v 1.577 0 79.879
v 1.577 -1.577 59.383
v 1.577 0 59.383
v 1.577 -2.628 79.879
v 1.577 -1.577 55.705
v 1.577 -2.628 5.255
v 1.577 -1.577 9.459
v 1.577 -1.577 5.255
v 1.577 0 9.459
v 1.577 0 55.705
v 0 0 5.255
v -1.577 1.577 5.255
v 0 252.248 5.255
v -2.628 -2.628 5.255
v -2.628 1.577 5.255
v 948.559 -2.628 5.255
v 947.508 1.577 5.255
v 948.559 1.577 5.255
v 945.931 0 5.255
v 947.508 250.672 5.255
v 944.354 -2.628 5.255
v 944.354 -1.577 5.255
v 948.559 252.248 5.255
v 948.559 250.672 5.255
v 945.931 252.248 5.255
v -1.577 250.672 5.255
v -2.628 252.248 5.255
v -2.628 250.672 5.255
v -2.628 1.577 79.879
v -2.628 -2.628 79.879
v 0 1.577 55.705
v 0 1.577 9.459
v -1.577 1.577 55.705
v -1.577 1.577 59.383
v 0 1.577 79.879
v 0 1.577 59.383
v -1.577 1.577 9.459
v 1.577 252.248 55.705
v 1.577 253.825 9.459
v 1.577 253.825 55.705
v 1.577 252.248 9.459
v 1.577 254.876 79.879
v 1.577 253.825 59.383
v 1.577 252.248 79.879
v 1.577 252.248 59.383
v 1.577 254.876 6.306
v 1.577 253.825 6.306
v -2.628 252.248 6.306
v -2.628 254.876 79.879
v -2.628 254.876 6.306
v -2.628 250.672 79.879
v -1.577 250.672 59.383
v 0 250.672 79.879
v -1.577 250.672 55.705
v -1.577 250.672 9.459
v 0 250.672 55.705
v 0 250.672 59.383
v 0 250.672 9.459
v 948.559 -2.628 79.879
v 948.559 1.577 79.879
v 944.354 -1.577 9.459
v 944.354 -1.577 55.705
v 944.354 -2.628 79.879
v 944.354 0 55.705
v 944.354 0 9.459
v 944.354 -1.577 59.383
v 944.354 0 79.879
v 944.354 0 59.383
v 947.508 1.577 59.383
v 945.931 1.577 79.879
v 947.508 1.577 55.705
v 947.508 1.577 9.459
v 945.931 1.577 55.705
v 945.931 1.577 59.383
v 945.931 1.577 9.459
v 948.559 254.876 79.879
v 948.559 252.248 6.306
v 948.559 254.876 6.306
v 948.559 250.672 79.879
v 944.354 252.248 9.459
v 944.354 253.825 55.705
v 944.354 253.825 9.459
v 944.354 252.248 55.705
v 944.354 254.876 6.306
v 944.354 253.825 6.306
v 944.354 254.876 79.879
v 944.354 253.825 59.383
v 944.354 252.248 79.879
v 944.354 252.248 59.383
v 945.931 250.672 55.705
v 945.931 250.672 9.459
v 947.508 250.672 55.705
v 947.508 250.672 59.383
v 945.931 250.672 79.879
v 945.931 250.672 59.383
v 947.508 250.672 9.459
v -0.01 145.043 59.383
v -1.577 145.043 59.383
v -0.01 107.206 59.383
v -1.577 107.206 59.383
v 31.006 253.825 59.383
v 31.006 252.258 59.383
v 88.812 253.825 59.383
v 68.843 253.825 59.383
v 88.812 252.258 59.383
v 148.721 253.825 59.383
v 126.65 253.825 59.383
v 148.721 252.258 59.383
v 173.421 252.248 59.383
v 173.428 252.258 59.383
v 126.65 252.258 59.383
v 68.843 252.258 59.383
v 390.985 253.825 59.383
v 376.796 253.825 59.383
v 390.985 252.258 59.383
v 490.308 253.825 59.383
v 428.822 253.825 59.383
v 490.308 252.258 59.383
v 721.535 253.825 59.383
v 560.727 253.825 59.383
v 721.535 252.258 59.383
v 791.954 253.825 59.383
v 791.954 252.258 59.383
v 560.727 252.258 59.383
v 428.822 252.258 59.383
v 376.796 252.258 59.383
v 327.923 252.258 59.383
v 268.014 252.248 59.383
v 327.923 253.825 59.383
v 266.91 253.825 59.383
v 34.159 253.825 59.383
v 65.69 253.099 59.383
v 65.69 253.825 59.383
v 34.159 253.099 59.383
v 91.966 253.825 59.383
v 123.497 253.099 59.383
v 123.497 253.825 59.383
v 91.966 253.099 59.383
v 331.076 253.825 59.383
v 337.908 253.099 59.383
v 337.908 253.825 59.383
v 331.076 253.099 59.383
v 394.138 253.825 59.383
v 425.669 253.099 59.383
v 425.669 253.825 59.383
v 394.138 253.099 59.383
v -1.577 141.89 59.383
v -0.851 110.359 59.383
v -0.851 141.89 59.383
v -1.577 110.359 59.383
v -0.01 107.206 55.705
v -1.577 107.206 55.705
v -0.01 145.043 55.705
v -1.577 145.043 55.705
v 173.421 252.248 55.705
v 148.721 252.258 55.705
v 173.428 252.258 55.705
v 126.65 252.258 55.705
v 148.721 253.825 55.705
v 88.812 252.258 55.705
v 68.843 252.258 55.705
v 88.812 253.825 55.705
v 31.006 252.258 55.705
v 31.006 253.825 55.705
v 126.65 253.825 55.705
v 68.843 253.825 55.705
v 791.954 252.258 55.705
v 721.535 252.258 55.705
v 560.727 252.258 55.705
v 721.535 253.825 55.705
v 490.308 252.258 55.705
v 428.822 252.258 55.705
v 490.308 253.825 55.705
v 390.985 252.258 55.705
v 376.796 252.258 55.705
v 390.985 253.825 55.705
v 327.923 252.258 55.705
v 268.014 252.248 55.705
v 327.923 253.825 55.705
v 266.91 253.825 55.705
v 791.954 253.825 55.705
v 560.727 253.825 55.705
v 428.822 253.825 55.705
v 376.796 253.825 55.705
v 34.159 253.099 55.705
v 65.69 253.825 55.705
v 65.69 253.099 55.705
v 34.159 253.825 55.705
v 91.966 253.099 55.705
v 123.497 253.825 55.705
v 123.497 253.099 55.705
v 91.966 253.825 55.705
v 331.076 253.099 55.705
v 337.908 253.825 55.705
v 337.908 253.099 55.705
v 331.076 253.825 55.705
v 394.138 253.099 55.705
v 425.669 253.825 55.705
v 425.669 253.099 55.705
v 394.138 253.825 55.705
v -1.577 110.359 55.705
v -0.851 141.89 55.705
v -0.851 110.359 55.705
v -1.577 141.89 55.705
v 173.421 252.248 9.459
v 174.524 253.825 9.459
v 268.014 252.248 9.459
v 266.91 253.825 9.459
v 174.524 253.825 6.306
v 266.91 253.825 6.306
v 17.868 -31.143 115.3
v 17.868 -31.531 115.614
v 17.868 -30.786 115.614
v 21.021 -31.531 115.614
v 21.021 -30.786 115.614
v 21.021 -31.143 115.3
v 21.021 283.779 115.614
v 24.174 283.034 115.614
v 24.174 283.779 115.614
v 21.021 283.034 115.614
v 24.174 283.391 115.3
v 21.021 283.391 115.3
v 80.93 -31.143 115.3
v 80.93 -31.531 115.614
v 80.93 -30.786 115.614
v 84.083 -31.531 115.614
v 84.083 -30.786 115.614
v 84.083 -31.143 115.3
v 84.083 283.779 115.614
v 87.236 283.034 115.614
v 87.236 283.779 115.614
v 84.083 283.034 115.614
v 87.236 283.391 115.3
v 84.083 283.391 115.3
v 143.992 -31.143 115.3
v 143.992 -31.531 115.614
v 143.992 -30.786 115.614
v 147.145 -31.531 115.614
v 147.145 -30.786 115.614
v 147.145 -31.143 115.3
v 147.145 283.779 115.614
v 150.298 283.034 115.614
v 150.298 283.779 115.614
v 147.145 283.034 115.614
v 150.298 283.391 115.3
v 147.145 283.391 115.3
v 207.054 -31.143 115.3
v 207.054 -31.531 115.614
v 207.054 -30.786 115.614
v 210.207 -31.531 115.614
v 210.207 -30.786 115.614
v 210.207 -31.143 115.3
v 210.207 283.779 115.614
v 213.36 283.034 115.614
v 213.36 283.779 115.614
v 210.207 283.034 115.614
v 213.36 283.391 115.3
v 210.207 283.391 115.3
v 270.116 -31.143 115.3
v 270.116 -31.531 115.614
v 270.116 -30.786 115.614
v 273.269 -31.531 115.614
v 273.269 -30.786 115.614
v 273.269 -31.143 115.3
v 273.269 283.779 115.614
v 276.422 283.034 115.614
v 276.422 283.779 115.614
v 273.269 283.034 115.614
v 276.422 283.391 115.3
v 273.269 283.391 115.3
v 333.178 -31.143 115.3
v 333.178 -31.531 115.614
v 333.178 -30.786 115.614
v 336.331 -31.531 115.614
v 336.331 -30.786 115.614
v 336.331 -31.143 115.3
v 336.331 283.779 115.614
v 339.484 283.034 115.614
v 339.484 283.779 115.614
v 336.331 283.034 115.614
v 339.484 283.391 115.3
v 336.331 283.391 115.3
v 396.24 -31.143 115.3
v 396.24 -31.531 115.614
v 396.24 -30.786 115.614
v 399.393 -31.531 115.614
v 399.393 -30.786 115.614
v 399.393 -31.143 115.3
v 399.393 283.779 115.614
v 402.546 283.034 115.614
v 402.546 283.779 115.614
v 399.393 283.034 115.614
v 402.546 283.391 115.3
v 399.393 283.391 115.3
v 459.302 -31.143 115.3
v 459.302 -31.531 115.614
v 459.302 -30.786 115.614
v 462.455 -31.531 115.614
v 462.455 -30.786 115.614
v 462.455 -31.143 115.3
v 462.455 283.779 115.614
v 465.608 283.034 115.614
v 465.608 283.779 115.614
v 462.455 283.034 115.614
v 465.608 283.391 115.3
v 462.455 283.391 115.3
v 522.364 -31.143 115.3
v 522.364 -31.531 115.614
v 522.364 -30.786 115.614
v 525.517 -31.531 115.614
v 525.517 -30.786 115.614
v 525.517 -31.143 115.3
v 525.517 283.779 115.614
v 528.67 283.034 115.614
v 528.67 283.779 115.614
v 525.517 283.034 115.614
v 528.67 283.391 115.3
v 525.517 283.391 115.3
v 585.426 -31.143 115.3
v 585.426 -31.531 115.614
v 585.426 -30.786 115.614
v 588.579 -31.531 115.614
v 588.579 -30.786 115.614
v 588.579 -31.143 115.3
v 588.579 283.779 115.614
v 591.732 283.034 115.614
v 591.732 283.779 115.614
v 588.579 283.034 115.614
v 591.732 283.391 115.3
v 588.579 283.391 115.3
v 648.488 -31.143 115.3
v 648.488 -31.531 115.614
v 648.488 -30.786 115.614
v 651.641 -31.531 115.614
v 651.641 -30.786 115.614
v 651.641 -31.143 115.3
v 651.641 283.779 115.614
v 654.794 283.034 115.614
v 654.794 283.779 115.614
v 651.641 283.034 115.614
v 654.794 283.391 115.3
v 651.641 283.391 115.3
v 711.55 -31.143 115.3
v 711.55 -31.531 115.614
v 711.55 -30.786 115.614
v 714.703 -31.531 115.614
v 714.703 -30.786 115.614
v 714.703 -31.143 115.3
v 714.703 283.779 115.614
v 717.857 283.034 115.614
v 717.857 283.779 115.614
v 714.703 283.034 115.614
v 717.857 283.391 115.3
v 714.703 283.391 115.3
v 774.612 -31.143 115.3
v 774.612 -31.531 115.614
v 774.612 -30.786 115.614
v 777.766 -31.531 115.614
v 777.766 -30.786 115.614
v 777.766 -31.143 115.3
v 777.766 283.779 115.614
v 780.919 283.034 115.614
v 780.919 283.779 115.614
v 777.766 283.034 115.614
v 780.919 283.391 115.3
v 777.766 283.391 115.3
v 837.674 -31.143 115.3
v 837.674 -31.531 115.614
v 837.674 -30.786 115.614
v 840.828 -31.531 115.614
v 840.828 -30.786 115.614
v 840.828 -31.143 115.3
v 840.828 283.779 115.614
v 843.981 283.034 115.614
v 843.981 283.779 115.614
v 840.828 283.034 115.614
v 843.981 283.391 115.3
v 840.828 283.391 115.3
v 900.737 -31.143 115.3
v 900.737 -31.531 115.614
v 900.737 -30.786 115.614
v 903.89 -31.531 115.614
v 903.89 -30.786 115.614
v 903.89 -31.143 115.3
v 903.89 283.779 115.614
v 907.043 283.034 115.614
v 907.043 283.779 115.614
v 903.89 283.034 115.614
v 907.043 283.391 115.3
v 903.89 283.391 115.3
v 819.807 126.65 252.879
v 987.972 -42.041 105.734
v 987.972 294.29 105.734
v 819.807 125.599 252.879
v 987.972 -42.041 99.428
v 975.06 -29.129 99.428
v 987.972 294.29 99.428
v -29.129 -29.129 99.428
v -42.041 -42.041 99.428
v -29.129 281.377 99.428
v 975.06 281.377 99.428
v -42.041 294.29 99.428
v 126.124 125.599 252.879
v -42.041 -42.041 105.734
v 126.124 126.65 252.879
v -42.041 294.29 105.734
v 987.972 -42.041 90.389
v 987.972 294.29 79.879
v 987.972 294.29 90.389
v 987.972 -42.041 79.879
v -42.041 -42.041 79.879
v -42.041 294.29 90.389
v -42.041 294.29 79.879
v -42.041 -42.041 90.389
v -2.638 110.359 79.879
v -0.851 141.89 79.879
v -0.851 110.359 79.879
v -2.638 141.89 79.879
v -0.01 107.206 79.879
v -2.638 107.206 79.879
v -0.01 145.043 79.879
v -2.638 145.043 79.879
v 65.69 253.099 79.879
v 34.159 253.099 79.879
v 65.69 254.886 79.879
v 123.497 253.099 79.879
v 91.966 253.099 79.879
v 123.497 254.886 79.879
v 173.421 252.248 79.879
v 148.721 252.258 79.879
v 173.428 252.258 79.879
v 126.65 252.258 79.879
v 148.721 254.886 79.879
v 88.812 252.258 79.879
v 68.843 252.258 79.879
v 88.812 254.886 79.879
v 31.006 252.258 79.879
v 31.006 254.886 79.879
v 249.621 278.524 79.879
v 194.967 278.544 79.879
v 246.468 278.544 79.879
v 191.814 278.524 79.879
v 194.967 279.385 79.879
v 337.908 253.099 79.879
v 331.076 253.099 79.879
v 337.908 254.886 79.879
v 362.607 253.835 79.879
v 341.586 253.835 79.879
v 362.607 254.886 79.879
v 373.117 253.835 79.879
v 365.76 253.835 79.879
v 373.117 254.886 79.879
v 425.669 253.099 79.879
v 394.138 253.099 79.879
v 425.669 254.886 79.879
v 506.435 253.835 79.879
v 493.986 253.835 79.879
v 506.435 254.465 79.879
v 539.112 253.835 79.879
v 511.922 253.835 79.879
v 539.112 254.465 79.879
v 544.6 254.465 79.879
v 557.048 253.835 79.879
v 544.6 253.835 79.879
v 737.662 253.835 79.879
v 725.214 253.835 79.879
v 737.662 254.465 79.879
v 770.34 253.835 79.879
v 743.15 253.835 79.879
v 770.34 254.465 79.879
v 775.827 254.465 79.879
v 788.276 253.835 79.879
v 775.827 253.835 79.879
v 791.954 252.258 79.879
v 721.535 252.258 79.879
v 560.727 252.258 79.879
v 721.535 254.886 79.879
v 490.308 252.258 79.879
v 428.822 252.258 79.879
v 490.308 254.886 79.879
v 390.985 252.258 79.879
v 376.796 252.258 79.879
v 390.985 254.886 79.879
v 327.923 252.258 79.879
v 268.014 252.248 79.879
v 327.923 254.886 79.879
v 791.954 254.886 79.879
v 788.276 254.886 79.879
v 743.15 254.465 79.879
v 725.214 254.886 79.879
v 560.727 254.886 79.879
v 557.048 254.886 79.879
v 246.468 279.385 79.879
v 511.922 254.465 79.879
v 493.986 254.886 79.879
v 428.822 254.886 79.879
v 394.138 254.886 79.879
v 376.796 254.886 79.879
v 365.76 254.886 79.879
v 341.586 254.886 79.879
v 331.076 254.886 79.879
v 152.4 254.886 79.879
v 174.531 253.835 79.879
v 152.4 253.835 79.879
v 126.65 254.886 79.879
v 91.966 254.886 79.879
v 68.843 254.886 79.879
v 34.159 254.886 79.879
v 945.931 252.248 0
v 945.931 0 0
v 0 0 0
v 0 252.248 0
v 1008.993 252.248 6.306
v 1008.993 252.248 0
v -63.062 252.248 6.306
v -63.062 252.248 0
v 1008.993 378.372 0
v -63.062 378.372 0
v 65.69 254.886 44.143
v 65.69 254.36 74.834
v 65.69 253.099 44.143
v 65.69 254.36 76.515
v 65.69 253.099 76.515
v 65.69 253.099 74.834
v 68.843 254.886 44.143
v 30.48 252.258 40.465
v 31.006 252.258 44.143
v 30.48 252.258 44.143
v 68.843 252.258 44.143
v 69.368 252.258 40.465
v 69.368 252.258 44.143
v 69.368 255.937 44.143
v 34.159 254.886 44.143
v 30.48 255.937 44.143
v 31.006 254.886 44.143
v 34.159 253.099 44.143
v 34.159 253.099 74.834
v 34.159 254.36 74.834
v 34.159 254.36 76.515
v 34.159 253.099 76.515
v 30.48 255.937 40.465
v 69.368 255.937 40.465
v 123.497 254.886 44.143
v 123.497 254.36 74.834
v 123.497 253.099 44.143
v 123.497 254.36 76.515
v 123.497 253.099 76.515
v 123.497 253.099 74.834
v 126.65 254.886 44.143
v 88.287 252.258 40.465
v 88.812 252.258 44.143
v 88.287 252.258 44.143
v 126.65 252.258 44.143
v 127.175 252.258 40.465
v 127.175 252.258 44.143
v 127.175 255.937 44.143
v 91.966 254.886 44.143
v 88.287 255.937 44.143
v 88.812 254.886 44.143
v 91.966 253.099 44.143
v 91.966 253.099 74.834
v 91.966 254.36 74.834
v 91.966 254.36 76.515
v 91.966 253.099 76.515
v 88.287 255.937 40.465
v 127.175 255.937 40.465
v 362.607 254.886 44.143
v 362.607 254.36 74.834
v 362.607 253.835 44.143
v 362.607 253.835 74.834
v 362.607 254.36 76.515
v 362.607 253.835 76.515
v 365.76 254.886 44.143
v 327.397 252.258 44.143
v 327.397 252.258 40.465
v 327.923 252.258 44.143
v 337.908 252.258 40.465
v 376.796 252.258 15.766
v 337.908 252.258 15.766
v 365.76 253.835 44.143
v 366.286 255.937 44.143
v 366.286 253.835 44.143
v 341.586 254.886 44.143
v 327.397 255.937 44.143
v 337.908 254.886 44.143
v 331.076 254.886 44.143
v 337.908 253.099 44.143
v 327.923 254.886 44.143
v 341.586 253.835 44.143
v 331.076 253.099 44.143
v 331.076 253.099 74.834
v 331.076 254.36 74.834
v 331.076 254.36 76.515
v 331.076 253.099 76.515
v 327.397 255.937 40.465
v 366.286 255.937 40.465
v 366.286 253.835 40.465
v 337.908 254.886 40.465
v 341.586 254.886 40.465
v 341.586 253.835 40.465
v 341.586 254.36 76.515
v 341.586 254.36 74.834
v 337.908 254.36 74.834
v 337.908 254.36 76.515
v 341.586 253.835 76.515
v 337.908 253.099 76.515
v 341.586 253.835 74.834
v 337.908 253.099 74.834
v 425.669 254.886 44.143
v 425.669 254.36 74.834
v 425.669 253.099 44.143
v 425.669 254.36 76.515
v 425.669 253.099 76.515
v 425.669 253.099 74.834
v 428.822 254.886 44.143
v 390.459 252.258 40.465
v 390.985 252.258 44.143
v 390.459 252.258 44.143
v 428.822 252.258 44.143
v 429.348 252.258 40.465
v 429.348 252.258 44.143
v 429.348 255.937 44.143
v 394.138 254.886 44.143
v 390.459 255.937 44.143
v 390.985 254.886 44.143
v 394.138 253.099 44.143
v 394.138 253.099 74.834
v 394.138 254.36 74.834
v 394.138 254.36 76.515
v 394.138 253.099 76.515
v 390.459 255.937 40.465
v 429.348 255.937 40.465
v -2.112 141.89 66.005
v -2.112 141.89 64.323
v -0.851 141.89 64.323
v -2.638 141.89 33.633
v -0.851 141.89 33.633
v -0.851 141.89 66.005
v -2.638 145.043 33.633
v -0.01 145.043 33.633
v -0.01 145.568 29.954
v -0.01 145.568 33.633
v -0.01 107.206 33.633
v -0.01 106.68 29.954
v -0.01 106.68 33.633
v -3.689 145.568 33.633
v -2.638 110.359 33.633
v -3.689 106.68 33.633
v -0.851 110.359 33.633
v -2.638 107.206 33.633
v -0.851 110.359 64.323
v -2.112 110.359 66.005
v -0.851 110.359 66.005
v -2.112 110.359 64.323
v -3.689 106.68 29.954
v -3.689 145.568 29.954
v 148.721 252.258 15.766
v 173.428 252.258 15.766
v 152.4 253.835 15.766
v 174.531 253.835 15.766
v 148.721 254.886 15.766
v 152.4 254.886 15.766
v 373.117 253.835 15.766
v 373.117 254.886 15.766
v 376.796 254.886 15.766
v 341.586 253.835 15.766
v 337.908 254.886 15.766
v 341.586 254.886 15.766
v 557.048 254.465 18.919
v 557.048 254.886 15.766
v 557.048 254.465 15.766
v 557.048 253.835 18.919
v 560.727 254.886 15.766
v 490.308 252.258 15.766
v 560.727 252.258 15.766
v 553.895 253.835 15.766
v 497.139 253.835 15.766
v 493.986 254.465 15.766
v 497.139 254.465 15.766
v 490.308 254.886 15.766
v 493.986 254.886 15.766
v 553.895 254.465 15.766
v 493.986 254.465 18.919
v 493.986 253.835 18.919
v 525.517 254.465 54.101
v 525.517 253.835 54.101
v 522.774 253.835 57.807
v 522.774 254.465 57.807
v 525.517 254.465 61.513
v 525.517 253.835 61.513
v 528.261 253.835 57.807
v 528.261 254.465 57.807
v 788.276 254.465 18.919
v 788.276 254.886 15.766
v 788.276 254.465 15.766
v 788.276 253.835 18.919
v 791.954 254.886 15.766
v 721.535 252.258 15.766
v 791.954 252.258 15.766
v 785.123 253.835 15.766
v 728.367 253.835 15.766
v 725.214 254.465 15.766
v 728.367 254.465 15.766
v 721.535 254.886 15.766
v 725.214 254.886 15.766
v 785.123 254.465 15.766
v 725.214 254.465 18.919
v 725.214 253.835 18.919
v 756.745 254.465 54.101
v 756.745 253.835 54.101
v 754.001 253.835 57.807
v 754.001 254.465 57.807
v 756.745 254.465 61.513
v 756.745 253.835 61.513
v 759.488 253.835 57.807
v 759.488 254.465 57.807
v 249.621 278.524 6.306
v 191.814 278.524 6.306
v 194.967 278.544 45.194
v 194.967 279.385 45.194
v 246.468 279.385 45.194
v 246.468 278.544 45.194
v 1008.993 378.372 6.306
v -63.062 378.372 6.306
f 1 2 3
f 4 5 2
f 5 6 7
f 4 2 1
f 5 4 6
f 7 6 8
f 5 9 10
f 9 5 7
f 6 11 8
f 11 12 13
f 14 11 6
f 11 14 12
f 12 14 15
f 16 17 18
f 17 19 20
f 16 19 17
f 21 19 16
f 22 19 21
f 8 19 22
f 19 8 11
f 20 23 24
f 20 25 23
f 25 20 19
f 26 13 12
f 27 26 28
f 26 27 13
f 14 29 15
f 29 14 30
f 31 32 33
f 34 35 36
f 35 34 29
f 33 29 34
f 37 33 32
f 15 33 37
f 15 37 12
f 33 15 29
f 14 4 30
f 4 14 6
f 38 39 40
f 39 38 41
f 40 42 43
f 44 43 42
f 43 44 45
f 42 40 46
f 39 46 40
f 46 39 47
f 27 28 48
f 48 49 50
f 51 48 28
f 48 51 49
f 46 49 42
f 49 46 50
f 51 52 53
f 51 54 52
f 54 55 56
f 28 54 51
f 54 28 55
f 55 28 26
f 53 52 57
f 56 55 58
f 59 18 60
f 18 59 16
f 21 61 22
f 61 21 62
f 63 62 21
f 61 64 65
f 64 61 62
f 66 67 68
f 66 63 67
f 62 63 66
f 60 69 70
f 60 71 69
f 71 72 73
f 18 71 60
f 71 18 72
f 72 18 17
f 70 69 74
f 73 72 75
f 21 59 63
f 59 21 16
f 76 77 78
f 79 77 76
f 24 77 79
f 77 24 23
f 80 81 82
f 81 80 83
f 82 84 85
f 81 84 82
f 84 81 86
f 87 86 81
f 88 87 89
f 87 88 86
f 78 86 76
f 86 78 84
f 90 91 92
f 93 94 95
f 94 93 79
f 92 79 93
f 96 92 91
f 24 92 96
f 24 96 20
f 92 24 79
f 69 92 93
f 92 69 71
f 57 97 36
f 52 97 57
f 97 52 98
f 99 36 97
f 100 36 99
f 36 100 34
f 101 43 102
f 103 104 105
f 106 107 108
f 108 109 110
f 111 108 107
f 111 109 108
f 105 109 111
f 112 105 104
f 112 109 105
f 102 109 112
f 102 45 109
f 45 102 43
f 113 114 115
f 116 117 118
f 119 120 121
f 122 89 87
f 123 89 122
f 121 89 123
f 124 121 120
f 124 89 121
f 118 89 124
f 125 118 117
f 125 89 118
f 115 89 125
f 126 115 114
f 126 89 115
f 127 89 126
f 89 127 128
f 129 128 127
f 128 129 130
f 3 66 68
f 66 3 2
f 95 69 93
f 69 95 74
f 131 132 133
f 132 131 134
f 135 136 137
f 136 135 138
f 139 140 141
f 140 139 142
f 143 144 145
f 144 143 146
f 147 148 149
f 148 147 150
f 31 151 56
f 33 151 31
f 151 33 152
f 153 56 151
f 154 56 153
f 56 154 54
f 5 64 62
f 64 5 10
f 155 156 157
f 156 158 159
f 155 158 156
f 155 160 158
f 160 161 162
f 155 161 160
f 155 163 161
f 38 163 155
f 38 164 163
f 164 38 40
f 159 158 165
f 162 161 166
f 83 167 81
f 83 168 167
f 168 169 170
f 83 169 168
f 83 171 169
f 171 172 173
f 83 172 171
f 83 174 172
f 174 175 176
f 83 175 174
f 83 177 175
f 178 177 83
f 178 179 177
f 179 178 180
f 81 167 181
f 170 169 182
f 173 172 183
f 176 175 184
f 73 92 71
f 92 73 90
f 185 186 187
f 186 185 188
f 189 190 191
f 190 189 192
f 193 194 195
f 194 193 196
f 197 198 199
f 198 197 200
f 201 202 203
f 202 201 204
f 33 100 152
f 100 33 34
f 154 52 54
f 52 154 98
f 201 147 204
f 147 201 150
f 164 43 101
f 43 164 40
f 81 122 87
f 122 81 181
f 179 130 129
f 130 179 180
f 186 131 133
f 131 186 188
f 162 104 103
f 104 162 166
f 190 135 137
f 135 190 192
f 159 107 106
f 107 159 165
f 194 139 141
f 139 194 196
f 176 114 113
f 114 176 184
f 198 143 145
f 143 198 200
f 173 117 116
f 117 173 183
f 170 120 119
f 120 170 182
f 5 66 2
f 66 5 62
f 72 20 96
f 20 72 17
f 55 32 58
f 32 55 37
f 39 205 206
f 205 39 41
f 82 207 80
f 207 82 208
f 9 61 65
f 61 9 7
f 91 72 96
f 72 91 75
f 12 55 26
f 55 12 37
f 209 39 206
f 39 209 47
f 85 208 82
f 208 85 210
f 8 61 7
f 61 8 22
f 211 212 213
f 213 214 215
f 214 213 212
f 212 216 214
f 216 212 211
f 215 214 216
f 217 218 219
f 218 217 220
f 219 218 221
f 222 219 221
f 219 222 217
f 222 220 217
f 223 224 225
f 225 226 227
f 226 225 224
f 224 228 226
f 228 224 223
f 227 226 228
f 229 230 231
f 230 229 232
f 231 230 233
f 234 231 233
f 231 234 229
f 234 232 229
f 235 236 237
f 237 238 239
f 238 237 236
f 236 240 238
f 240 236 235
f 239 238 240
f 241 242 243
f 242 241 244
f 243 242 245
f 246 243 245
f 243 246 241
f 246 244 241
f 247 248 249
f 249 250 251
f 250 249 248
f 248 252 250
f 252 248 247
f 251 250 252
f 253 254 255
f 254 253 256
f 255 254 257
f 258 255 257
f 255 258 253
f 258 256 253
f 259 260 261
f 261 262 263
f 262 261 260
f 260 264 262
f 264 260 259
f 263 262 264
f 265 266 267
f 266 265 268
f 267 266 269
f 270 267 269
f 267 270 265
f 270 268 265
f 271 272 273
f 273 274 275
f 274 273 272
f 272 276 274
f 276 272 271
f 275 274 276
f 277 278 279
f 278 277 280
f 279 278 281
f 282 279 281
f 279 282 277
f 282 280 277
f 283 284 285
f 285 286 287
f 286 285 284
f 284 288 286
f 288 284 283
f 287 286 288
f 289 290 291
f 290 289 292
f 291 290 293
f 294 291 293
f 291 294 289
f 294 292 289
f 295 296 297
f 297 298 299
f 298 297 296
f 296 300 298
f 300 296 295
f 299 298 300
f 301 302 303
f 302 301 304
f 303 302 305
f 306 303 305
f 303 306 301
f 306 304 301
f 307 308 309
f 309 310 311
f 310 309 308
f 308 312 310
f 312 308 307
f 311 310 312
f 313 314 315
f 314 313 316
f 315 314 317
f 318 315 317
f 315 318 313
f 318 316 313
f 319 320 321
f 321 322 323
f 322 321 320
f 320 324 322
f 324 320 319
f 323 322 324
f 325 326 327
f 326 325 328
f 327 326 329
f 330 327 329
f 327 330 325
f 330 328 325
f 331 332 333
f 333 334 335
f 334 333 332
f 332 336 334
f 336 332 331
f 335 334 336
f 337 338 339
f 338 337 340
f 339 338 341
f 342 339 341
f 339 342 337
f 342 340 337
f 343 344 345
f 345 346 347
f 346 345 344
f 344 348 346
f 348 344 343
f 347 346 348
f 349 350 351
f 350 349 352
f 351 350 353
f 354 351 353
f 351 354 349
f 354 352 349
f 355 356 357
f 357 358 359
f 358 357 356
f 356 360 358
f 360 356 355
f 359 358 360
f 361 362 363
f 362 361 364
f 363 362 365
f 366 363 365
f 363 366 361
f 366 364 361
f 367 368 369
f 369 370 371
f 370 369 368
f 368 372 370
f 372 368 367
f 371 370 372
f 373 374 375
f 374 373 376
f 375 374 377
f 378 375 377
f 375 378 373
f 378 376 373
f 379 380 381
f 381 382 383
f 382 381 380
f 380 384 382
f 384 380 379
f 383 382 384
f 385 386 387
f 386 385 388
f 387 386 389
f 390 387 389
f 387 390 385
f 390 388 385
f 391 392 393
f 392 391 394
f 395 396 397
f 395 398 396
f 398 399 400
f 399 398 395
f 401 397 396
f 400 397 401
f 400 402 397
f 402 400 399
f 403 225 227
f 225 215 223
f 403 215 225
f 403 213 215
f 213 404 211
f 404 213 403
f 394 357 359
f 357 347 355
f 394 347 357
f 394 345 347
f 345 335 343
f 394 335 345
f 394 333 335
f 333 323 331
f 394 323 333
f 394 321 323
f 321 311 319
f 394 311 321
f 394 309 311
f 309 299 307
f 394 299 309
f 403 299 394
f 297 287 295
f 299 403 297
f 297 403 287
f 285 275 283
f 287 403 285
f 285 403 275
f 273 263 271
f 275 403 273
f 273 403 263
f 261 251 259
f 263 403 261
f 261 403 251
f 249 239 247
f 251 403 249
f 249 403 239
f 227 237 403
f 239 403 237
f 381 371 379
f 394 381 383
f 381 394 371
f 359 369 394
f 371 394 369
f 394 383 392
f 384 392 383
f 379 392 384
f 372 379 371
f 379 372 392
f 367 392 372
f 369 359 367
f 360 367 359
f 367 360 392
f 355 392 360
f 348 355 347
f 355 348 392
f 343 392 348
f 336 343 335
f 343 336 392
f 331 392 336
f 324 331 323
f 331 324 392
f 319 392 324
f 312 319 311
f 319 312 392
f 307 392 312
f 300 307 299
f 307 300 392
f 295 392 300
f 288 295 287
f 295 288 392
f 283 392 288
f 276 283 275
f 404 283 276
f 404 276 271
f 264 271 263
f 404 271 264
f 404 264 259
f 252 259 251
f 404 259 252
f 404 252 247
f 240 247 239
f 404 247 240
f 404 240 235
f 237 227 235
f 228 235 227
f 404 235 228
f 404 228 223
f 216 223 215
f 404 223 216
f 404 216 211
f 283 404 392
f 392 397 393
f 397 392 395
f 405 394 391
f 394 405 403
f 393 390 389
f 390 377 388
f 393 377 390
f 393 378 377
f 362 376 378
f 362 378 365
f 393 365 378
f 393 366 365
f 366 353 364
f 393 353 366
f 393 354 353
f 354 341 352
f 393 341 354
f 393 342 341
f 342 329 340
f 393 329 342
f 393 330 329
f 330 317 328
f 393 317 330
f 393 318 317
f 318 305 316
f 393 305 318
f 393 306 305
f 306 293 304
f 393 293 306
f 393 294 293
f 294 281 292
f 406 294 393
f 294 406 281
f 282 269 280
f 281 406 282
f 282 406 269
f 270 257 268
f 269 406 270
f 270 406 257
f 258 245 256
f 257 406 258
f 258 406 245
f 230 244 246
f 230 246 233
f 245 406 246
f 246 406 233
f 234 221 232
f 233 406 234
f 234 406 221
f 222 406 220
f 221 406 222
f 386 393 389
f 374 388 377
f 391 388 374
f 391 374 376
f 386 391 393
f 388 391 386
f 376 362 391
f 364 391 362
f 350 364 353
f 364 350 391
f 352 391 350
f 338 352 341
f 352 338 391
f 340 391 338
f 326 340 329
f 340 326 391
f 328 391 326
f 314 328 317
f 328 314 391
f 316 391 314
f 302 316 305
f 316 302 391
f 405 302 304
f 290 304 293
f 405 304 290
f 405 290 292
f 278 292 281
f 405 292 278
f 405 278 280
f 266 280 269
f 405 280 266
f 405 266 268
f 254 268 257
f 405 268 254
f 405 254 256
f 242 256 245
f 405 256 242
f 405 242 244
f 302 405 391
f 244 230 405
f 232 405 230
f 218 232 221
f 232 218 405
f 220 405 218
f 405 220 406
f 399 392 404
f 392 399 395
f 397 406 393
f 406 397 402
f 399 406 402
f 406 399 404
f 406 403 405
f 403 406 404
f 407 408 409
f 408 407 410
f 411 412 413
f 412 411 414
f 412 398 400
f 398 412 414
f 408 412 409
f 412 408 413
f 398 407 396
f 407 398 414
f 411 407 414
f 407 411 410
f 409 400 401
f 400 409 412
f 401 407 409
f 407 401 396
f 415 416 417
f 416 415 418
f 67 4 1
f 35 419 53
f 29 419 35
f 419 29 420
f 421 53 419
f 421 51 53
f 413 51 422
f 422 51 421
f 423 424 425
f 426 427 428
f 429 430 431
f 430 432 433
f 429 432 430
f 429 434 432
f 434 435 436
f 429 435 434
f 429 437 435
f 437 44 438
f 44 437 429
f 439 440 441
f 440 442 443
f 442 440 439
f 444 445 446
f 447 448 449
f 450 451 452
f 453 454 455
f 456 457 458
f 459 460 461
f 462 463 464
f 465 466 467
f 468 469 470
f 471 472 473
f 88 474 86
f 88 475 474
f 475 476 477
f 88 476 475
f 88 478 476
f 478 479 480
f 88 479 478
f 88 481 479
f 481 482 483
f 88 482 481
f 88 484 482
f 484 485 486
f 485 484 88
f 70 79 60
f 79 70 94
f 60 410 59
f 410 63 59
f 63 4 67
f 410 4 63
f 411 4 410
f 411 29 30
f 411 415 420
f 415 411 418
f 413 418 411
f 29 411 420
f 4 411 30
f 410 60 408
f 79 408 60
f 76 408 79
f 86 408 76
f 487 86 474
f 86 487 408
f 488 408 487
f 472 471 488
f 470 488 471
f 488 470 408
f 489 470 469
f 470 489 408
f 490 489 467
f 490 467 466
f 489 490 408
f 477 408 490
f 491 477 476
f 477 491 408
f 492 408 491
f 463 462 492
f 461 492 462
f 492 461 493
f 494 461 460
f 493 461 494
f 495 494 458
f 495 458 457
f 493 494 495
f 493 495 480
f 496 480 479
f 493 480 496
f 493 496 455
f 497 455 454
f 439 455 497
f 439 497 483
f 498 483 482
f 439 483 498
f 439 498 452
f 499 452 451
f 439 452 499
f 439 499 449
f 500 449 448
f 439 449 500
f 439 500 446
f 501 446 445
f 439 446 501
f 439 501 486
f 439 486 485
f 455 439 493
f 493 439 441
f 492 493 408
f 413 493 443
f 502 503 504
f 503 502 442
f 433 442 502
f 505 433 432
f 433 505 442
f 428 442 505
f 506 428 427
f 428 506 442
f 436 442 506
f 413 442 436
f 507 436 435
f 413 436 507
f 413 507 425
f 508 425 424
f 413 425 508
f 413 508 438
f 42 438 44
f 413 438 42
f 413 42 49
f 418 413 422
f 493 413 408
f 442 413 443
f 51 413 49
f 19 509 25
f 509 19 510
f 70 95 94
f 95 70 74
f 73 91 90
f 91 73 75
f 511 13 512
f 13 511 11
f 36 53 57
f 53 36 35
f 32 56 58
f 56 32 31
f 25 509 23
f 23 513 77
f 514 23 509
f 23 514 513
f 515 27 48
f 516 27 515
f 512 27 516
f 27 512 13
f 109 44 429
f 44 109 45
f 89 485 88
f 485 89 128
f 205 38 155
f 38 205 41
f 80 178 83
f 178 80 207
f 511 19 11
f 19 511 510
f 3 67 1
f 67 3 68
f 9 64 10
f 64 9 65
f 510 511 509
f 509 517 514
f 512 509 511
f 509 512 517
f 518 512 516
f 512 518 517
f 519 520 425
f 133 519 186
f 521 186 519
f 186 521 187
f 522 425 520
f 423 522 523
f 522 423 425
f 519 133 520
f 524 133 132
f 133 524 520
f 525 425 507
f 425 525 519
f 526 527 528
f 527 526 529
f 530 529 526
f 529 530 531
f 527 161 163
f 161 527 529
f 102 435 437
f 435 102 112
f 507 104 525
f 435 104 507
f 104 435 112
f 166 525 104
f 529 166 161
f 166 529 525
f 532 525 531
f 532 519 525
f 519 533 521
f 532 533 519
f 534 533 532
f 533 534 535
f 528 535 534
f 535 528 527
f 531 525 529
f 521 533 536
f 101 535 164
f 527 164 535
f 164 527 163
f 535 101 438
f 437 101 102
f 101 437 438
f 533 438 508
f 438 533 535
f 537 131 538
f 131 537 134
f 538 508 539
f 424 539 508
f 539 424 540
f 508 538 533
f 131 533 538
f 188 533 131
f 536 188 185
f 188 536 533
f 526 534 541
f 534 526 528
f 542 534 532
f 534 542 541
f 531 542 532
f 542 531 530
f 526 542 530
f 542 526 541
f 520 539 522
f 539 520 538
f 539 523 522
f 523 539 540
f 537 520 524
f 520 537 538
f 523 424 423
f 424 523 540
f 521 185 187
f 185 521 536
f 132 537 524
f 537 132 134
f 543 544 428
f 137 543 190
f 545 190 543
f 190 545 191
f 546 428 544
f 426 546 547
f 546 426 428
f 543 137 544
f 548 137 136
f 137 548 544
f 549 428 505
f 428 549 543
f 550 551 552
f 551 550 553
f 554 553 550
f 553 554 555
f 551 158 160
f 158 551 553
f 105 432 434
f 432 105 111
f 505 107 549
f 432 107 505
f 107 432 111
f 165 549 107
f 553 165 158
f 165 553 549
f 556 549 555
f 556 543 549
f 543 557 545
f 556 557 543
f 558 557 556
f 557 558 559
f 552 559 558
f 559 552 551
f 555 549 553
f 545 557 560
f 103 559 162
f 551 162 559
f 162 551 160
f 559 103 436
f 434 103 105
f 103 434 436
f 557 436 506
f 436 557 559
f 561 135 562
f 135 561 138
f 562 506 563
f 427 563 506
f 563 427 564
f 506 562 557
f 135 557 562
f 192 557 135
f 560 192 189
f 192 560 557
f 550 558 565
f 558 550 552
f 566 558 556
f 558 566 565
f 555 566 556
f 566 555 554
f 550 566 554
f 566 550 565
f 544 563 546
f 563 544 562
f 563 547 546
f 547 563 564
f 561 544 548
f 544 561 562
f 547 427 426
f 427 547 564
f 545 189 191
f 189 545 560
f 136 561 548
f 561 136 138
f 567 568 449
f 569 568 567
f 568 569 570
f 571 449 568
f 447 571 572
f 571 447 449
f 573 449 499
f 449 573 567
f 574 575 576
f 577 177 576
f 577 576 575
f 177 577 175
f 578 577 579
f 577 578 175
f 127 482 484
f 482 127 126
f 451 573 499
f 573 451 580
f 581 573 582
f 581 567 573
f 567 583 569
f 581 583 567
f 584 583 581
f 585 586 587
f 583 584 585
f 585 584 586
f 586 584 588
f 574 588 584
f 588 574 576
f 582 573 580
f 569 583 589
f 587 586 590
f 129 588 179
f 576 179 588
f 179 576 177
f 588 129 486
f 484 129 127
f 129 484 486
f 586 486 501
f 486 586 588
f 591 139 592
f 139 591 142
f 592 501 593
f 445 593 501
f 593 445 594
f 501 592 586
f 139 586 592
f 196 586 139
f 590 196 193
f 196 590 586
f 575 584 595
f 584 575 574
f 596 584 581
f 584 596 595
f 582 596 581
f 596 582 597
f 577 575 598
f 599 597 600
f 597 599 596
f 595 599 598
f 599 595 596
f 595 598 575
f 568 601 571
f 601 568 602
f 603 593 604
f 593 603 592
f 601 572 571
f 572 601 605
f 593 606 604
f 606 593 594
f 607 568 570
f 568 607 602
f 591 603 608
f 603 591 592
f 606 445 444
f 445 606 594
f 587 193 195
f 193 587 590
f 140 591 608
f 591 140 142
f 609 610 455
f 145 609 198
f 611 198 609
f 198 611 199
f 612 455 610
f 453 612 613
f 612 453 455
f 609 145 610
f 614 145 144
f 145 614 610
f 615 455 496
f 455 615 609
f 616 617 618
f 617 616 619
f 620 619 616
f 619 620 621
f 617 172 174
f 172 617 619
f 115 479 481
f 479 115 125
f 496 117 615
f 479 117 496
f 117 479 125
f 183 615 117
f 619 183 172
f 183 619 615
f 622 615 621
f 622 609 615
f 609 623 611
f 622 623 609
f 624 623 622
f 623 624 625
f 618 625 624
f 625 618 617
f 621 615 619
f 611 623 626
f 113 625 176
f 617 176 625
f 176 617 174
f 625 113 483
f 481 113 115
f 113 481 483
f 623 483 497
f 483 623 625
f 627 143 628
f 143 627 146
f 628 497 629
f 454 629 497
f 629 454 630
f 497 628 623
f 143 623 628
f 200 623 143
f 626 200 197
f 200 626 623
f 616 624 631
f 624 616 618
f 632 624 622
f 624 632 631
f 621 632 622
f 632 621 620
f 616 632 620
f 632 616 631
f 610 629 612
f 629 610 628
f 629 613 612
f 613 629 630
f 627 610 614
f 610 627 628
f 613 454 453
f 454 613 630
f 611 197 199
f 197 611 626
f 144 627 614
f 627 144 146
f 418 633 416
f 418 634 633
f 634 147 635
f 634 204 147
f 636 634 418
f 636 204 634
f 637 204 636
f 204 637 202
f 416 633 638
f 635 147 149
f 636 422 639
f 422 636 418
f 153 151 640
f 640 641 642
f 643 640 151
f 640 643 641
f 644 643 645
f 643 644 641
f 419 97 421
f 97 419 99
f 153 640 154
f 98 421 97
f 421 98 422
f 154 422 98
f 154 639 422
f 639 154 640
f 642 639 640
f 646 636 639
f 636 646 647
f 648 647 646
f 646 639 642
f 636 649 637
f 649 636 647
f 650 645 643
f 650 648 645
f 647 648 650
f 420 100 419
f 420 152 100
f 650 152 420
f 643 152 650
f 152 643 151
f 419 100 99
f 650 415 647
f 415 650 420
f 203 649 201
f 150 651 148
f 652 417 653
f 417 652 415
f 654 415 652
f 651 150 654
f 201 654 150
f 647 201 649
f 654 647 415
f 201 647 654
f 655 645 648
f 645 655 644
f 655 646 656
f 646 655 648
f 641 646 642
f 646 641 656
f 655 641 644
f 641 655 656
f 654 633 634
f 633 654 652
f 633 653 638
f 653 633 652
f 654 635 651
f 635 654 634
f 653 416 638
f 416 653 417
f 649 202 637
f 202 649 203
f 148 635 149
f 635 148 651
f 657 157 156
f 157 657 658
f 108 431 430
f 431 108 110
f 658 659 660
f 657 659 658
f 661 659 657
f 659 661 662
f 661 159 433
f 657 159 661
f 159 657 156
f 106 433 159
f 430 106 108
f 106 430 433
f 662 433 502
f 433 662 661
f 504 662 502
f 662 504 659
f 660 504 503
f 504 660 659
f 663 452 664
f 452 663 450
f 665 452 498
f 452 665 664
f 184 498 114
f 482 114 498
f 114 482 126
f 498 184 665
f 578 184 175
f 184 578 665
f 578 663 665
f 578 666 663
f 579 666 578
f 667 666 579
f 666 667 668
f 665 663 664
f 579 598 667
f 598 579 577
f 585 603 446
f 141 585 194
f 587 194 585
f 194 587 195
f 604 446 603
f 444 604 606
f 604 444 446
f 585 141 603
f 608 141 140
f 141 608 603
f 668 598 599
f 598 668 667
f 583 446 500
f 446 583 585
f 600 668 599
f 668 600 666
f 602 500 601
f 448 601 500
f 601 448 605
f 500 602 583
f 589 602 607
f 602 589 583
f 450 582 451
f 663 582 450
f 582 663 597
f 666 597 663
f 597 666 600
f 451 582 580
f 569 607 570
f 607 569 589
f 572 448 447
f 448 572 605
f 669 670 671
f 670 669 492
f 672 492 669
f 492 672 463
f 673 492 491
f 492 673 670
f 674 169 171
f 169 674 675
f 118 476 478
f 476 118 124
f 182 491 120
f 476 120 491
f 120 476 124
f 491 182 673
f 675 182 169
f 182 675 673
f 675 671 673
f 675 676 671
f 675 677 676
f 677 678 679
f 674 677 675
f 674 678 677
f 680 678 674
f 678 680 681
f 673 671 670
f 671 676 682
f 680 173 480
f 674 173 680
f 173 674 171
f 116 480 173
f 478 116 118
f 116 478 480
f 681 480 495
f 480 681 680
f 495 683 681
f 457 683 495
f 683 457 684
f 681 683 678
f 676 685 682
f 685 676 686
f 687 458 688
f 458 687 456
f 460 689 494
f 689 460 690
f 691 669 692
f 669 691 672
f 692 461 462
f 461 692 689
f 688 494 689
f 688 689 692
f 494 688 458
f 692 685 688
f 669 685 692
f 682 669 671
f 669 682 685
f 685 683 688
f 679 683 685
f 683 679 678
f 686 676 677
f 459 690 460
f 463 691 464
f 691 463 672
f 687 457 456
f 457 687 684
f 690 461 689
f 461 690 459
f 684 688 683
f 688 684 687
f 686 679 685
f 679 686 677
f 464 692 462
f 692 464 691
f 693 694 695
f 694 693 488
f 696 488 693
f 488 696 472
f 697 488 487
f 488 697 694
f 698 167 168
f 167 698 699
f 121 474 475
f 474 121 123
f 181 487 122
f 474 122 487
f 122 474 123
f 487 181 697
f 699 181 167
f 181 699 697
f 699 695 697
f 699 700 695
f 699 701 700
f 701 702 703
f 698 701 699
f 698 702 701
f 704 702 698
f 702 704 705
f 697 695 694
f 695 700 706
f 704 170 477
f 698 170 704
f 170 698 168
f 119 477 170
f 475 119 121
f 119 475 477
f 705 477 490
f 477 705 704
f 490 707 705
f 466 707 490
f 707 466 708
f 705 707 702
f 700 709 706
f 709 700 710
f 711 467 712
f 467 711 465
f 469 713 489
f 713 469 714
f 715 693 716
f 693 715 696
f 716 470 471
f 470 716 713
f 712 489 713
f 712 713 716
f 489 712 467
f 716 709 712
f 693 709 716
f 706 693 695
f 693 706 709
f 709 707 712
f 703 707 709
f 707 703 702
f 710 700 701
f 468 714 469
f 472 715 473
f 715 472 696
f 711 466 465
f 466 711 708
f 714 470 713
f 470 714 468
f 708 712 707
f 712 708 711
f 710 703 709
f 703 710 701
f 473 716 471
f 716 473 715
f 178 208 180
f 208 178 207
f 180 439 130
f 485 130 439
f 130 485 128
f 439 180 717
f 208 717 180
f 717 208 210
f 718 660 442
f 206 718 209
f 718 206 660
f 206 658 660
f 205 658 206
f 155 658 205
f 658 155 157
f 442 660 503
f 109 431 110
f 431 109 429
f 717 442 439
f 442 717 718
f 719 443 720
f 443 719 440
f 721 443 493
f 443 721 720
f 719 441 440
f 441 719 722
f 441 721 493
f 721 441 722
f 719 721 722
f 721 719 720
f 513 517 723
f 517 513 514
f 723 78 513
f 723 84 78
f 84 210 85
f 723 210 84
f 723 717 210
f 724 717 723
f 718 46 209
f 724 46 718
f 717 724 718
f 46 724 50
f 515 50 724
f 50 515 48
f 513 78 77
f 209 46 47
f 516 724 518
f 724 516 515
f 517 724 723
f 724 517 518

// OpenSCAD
// =====================================================================
//  MILWAUKEE ROAD - STANDARD 24 X 90 FT DEPOT, FARMINGTON (C.M.&ST.P., NOV 1898)
//  Album of Depot Plans (1919), sheet 13. Private reference (in copyright):
//  Research Library / RSW / Stations / Standard depots / Album of Depot Plans 1919.
//  Rib Side Works, 24 Nov 2026. FIRST SHAPE MODEL for review - not cut into print sections.
//  KNOWN (from the sheet): 24 x 90 ft (the sheet says 24 x 90): waiting room 14, office 14 with bay, waiting room 14, baggage room 12, freight room 35; flared hipped shingle roof with cresting, lap siding over drop siding.
//  ESTIMATE: wall and ridge heights (sheets are small copies), window spacing, colours.
//  Shared depot builder ../../../_common/rsw_depot.scad (x along the track, y = 0 town side,
//  track side +y, feet).  SCALE: 29 = G, 48 = O, 87 = HO.
// =====================================================================
SCALE = 29;
include <../../../_common/rsw_depot.scad>

depot(blocks = [[0, 90, 0, 24, 11, 0.7, 3, 4, 0]],
      pavs   = [],
      wins   = [[4.75, 1, 3, 6, 4.2], [10.25, 1, 3, 6, 4.2], [33.0, 1, 3, 6, 4.2], [39.0, 1, 3, 6, 4.2], [12, 2, 3, 6, 3.2]],
      doors  = [[16, 1, 3, 7.5, 0], [34, 1, 3, 7.5, 0], [50, 1, 6, 8, 2], [72, 1, 6, 8, 2]],
      bays   = [[21, 1, 9, 2.5]],
      chims  = [[18, 12, 22.4], [42, 12, 22.4]],
      plat   = [-6, 102, 12, 0.6]);
